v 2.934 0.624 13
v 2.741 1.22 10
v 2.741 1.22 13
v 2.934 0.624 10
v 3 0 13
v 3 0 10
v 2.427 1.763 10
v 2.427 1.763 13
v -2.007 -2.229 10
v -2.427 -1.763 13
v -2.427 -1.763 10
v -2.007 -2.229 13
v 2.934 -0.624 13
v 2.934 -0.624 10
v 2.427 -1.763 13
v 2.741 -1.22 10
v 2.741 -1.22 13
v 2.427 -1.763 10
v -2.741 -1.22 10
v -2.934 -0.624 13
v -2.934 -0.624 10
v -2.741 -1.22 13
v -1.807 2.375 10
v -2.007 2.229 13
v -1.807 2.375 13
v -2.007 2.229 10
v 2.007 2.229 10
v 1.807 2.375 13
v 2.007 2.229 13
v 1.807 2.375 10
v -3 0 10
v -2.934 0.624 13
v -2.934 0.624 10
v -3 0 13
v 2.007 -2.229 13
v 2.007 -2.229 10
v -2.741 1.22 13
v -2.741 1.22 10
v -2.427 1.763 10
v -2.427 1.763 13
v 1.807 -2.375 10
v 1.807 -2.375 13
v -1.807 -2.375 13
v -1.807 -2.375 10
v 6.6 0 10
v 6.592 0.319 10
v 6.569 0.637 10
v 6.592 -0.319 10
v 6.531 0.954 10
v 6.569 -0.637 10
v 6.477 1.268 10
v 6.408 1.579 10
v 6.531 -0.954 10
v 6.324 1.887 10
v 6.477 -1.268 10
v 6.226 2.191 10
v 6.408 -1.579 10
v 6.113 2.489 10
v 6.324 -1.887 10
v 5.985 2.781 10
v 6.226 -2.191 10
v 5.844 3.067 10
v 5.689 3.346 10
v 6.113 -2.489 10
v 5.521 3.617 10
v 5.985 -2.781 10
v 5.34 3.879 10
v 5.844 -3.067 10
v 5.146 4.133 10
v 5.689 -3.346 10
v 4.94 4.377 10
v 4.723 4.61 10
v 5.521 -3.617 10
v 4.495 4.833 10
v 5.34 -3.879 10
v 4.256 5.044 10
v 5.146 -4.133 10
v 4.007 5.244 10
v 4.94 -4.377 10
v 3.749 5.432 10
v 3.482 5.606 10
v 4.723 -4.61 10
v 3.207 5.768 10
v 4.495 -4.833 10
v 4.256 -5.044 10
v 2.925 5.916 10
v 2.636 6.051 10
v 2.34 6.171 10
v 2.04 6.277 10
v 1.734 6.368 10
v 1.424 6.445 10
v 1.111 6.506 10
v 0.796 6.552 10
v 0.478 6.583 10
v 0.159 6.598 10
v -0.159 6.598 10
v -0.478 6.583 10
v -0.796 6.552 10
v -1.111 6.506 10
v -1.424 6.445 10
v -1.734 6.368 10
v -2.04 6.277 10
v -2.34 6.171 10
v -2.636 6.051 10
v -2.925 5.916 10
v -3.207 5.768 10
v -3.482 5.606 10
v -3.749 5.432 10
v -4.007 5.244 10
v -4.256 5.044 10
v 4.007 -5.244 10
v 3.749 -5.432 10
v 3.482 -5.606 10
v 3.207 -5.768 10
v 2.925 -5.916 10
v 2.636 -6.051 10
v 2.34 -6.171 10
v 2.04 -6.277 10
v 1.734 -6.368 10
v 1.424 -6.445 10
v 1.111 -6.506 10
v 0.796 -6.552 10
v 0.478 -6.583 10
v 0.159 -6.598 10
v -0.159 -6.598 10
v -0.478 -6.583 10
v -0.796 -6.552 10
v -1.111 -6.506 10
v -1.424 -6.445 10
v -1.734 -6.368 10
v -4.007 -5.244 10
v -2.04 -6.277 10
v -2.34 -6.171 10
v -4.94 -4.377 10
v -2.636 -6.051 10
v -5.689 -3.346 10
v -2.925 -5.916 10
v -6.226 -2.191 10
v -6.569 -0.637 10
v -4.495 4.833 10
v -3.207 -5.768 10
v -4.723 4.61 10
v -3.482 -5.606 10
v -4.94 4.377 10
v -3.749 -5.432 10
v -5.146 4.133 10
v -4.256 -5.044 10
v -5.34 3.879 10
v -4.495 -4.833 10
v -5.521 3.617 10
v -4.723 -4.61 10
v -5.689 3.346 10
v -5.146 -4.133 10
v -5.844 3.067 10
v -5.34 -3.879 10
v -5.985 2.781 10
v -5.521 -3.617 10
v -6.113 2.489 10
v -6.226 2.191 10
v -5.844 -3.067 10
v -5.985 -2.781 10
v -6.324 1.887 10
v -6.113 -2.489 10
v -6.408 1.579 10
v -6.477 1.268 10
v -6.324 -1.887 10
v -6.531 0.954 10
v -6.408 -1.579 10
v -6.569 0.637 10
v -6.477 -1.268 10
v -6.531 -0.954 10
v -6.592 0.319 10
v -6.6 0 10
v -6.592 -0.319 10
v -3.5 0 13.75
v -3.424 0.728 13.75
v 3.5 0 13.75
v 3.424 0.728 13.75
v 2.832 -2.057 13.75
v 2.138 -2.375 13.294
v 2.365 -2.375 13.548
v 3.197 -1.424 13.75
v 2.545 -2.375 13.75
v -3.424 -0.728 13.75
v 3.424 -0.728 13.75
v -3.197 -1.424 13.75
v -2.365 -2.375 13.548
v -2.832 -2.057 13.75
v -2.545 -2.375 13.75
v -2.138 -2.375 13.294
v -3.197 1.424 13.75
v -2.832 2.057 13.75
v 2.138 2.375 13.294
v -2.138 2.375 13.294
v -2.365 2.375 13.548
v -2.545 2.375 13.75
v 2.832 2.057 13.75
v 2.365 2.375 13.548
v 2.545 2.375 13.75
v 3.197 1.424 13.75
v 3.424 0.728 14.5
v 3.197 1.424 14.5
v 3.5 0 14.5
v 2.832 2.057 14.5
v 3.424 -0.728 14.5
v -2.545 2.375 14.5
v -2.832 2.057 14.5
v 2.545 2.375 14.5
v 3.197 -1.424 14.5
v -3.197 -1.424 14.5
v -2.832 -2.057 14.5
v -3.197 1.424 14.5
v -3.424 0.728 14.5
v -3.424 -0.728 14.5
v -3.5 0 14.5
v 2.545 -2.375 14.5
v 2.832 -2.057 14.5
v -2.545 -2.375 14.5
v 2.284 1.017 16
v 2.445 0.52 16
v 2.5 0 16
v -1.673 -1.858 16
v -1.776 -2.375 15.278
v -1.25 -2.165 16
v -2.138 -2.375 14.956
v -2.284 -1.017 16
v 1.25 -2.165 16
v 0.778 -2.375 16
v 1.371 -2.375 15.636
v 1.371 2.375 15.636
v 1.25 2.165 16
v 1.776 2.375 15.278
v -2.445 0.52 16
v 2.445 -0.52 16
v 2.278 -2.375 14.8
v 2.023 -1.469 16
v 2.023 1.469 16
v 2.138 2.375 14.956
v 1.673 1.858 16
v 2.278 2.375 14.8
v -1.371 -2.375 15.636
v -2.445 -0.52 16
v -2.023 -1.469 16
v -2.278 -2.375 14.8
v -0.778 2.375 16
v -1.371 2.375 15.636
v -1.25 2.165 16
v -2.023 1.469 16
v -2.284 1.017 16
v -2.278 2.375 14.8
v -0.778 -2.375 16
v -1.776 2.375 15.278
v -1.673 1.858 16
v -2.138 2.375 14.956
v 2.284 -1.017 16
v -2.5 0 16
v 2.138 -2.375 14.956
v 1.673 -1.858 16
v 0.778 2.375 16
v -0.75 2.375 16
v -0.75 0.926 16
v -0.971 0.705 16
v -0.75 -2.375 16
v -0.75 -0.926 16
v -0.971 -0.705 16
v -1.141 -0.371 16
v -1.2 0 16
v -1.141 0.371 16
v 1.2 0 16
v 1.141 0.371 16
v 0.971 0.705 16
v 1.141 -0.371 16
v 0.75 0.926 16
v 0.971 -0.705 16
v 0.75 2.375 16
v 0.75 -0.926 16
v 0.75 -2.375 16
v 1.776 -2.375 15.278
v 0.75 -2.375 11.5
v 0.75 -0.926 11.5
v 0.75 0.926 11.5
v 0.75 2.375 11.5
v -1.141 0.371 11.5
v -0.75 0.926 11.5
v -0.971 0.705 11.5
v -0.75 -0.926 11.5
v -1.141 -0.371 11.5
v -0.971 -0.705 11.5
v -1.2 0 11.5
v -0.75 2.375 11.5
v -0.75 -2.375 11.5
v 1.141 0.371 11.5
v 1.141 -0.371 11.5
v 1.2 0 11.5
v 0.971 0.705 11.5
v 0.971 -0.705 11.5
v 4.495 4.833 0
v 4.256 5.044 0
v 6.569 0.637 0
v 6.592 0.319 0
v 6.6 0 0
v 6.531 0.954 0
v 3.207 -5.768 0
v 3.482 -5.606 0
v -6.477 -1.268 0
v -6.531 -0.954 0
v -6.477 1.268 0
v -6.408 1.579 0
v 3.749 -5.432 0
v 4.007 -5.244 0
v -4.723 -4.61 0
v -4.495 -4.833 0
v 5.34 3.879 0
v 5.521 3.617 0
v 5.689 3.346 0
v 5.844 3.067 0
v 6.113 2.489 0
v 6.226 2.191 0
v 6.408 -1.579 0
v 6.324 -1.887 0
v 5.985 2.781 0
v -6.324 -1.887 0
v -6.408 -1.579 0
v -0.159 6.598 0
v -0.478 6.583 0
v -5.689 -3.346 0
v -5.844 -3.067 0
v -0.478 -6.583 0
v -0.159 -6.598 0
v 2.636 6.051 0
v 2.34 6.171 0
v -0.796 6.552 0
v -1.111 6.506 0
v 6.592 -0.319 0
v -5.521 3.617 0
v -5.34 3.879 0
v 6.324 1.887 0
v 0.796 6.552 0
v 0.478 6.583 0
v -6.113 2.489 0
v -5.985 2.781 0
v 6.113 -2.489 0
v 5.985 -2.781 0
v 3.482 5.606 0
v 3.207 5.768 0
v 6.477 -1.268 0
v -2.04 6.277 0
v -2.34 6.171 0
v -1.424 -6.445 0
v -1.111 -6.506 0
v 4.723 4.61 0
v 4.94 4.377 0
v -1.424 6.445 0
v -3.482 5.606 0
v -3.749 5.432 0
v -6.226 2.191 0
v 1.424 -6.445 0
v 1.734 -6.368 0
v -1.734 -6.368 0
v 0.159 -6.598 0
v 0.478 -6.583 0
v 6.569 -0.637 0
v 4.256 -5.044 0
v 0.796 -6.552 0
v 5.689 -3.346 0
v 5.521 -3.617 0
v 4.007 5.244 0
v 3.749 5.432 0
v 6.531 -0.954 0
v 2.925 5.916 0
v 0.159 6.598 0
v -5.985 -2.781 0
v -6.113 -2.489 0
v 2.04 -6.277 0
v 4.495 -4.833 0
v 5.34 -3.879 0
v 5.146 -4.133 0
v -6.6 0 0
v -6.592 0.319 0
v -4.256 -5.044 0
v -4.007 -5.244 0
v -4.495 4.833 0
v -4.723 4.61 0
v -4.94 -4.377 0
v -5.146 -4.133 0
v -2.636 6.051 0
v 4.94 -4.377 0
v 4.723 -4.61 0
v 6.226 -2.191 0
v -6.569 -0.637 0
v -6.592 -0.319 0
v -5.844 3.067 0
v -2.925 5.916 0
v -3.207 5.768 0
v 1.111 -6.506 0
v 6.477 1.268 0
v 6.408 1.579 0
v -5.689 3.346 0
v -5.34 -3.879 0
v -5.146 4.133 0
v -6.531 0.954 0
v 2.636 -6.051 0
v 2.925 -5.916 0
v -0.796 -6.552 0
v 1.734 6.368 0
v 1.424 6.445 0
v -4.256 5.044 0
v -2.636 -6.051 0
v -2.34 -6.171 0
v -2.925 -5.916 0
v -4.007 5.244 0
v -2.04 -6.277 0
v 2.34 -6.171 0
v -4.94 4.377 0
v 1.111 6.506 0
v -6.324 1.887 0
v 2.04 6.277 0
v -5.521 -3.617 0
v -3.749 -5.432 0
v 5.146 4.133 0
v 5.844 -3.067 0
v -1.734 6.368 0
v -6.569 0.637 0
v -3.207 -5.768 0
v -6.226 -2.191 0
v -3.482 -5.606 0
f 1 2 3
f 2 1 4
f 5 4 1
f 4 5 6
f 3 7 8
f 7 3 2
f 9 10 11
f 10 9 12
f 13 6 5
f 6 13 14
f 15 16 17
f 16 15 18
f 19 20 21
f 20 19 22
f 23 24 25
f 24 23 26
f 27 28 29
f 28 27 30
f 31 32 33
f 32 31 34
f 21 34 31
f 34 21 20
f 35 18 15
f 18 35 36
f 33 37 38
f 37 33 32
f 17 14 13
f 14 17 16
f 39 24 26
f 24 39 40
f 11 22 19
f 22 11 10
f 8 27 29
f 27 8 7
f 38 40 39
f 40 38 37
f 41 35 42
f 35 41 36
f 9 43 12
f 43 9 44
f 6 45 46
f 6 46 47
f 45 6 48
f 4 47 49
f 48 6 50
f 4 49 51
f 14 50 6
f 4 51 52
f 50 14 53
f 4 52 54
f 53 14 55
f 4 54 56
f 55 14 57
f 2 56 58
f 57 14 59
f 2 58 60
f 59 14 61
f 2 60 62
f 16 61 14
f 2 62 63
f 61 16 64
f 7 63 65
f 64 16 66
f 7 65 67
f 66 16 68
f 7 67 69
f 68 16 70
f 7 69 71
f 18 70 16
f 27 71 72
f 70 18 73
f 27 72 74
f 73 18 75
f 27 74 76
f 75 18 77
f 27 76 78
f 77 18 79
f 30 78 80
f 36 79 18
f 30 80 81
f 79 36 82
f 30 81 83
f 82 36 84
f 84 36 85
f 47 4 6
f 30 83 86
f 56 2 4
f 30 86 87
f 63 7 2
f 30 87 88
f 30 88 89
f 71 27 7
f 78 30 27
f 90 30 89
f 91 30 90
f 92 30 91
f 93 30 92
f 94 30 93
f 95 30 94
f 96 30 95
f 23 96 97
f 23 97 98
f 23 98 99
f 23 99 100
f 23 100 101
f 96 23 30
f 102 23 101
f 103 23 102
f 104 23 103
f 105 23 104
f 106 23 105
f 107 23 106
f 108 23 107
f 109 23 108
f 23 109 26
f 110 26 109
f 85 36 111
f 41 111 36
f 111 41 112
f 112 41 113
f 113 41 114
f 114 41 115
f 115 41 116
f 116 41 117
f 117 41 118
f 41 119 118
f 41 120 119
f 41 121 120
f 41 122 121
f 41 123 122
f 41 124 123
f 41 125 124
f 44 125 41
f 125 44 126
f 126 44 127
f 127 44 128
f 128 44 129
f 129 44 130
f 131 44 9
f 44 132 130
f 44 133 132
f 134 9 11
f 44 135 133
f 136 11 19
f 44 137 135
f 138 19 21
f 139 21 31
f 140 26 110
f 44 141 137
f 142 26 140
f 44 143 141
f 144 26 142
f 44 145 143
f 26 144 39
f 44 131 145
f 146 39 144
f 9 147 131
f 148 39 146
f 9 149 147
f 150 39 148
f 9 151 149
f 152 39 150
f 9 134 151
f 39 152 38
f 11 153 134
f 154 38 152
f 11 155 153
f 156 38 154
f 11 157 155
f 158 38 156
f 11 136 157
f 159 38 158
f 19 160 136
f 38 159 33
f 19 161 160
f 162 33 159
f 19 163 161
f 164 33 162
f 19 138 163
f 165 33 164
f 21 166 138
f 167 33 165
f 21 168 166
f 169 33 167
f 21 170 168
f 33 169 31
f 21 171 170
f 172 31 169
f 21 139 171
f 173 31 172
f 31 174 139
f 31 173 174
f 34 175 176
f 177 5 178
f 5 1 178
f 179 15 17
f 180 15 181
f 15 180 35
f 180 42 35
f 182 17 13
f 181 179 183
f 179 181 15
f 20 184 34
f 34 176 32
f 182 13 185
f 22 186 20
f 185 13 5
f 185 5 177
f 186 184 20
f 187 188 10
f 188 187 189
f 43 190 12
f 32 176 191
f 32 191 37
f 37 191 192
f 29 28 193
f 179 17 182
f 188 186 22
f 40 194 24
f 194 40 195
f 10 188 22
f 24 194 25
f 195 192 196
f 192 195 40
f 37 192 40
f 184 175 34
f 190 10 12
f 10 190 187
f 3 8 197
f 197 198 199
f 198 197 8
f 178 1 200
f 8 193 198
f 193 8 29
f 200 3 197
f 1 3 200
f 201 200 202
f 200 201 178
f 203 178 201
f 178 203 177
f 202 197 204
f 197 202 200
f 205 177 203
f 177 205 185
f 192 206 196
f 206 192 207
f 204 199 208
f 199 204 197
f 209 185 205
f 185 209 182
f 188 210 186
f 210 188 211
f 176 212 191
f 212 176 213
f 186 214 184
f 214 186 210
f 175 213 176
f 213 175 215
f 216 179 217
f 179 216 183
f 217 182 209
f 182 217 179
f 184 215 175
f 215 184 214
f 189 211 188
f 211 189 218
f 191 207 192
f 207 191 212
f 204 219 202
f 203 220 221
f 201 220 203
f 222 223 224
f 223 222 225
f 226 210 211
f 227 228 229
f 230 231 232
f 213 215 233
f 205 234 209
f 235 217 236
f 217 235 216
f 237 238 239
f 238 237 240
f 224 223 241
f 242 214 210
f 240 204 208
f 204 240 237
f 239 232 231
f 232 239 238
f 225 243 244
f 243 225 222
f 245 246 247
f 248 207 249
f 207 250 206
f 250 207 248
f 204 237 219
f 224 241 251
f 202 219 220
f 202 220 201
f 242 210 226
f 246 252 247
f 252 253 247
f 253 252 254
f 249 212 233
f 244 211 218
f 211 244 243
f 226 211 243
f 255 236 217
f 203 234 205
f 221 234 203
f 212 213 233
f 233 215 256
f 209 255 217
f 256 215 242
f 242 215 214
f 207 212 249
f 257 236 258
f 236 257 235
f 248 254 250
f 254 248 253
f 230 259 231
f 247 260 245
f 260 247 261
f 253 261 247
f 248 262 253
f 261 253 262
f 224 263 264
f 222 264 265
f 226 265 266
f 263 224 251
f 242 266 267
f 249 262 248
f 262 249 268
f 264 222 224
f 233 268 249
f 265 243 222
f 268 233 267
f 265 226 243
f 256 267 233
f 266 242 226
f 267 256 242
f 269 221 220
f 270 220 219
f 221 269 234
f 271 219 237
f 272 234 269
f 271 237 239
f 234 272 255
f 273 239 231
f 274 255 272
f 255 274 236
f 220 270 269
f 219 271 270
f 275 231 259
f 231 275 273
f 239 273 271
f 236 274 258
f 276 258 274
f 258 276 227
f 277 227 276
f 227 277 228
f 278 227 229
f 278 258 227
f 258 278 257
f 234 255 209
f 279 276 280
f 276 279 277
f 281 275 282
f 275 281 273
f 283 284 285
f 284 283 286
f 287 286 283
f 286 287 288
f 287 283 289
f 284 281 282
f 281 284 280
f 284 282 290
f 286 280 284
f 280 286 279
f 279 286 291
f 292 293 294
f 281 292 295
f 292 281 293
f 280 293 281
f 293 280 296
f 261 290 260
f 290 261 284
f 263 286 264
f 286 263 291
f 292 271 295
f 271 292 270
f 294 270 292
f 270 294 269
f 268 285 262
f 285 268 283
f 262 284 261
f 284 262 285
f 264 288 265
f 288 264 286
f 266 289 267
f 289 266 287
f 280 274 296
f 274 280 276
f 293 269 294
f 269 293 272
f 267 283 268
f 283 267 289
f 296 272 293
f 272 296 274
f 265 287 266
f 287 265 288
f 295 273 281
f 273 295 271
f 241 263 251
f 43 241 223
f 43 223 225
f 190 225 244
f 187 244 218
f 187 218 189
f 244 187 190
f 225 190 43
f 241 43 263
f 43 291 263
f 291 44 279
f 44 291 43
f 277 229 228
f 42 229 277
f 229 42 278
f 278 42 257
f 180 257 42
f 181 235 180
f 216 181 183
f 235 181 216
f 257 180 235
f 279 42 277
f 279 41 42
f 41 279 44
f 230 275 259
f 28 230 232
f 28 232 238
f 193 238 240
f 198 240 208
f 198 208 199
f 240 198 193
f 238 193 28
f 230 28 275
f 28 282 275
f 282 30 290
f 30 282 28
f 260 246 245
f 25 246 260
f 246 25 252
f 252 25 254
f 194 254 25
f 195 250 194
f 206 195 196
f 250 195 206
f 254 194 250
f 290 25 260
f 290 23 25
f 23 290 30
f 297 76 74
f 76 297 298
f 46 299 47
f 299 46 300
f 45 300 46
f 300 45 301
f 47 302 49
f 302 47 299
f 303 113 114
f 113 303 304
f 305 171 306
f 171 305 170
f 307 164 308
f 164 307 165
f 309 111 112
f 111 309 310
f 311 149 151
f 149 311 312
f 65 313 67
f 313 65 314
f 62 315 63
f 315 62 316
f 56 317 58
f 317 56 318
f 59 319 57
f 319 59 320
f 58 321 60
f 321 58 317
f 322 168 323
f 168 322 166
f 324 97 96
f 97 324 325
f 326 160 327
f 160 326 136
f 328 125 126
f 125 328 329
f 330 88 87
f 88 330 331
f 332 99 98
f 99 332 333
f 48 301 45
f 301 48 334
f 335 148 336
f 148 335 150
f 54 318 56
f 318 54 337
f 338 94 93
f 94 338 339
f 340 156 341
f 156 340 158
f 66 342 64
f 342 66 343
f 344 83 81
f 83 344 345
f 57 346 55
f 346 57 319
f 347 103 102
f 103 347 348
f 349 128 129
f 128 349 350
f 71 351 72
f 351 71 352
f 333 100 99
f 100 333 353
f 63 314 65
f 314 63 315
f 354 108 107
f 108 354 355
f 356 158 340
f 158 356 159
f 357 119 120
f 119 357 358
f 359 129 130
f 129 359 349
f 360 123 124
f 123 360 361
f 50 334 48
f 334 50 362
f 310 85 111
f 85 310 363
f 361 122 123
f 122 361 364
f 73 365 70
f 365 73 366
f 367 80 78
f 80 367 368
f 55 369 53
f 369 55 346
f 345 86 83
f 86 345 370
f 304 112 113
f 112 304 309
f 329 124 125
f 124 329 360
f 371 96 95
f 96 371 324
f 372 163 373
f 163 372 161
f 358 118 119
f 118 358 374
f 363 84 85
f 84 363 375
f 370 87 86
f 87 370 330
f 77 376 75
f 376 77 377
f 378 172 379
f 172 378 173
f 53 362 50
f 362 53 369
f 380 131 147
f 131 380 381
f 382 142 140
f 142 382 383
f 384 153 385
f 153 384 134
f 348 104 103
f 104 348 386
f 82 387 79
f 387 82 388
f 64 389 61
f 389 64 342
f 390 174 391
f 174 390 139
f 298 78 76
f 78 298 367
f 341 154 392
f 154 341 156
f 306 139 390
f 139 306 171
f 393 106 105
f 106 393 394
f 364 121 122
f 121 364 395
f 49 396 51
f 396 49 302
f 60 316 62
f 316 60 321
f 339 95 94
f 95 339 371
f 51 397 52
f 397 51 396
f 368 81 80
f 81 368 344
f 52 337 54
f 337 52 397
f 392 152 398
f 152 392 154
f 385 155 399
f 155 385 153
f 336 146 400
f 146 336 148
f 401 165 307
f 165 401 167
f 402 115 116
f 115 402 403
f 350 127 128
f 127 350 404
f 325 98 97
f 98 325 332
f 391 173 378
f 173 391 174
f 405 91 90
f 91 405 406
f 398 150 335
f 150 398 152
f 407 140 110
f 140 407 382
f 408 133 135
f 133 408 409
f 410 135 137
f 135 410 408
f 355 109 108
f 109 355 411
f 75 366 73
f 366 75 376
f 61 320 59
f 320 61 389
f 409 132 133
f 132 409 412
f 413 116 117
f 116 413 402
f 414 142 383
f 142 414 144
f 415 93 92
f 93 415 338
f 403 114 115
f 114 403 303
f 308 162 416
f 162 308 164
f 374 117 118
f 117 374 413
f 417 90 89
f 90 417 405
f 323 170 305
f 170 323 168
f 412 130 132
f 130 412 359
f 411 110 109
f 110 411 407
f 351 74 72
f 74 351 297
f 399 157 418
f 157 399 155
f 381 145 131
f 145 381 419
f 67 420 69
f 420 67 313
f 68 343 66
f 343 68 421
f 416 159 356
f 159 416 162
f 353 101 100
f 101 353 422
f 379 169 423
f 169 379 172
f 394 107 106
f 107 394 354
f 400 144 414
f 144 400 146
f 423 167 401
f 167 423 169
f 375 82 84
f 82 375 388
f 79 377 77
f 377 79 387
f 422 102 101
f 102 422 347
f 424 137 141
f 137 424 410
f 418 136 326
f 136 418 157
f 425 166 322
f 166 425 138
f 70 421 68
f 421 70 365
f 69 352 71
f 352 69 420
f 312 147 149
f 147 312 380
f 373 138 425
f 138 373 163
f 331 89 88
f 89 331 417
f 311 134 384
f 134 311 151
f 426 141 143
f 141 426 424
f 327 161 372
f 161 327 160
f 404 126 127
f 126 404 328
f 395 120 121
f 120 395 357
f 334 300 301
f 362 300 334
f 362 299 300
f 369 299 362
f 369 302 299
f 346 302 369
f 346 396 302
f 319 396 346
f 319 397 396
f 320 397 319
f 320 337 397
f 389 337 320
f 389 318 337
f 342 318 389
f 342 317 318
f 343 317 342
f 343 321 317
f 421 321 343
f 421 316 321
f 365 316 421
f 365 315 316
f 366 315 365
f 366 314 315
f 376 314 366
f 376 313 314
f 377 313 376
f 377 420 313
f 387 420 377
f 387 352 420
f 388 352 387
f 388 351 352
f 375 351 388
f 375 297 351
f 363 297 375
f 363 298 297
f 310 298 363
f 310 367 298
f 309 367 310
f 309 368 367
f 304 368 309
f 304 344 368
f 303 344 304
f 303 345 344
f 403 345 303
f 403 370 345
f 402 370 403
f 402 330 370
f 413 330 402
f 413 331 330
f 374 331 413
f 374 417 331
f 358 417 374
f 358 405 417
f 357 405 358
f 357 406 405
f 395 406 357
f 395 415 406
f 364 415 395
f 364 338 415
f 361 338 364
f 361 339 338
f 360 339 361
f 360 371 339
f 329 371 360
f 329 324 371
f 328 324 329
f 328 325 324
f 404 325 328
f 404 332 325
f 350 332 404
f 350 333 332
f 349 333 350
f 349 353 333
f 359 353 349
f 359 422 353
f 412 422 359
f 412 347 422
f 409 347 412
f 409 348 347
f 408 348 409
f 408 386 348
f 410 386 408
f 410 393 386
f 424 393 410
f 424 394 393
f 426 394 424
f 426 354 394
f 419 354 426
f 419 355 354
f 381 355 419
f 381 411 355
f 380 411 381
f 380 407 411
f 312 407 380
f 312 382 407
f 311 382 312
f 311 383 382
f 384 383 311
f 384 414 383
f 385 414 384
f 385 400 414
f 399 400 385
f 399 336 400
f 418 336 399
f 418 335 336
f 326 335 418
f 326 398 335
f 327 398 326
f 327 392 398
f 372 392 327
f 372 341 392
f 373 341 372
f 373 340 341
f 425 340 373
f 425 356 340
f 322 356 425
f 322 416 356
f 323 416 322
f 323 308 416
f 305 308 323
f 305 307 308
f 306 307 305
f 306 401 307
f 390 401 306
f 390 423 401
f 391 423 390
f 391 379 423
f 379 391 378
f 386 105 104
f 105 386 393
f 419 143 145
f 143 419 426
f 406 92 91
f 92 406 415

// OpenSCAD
$fn=130;

zylD=6.6;   //Zylinder-Durchmesser
zylH=10;    //Zylinder-Höhe
pinD=3;     //PIN-Durchmesser
pintack(h=6);//Pin-Höhe


module pin(h=10, r=4, lh=3, lt=1) { 
    pin_vertical(h, r, lh, lt);
}

module pintack(h=10, r=pinD, lh=3, lt=1,) {
   union() {
    cylinder(h=zylH, r=zylD);
    translate([0, 0, zylH]) pin(h, r, lh, lt);
  }
}

module pin_vertical(h=10, r=4, lh=3, lt=1) {

  difference() {
    pin_solid(h, r, lh, lt);
    translate([-r*0.5/2, -(r*2+lt*2)/2, h/4]) cube([r*0.5, r*2+lt*2, h]);
    translate([0, 0, h/4]) cylinder(h=h+lh, r=r/2.5, $fn=20);
    translate([-r*2, -lt-r*1.125, -1]) cube([r*4, lt*2, h+2]);
    translate([-r*2, -lt+r*1.125, -1]) cube([r*4, lt*2, h+2]);
  }
}

module pin_solid(h=10, r=4, lh=3, lt=1) {
  union() {

    cylinder(h=h-lh, r=r, $fn=30);
    translate([0, 0, h-lh]) cylinder(h=lh*0.25, r1=r, r2=r+(lt/2), $fn=30);
    translate([0, 0, h-lh+lh*0.25]) cylinder(h=lh*0.25, r=r+(lt/2), $fn=30);    
    translate([0, 0, h-lh+lh*0.50]) cylinder(h=lh*0.50, r1=r+(lt/2), r2=r-(lt/2), $fn=30);    
  }
}
